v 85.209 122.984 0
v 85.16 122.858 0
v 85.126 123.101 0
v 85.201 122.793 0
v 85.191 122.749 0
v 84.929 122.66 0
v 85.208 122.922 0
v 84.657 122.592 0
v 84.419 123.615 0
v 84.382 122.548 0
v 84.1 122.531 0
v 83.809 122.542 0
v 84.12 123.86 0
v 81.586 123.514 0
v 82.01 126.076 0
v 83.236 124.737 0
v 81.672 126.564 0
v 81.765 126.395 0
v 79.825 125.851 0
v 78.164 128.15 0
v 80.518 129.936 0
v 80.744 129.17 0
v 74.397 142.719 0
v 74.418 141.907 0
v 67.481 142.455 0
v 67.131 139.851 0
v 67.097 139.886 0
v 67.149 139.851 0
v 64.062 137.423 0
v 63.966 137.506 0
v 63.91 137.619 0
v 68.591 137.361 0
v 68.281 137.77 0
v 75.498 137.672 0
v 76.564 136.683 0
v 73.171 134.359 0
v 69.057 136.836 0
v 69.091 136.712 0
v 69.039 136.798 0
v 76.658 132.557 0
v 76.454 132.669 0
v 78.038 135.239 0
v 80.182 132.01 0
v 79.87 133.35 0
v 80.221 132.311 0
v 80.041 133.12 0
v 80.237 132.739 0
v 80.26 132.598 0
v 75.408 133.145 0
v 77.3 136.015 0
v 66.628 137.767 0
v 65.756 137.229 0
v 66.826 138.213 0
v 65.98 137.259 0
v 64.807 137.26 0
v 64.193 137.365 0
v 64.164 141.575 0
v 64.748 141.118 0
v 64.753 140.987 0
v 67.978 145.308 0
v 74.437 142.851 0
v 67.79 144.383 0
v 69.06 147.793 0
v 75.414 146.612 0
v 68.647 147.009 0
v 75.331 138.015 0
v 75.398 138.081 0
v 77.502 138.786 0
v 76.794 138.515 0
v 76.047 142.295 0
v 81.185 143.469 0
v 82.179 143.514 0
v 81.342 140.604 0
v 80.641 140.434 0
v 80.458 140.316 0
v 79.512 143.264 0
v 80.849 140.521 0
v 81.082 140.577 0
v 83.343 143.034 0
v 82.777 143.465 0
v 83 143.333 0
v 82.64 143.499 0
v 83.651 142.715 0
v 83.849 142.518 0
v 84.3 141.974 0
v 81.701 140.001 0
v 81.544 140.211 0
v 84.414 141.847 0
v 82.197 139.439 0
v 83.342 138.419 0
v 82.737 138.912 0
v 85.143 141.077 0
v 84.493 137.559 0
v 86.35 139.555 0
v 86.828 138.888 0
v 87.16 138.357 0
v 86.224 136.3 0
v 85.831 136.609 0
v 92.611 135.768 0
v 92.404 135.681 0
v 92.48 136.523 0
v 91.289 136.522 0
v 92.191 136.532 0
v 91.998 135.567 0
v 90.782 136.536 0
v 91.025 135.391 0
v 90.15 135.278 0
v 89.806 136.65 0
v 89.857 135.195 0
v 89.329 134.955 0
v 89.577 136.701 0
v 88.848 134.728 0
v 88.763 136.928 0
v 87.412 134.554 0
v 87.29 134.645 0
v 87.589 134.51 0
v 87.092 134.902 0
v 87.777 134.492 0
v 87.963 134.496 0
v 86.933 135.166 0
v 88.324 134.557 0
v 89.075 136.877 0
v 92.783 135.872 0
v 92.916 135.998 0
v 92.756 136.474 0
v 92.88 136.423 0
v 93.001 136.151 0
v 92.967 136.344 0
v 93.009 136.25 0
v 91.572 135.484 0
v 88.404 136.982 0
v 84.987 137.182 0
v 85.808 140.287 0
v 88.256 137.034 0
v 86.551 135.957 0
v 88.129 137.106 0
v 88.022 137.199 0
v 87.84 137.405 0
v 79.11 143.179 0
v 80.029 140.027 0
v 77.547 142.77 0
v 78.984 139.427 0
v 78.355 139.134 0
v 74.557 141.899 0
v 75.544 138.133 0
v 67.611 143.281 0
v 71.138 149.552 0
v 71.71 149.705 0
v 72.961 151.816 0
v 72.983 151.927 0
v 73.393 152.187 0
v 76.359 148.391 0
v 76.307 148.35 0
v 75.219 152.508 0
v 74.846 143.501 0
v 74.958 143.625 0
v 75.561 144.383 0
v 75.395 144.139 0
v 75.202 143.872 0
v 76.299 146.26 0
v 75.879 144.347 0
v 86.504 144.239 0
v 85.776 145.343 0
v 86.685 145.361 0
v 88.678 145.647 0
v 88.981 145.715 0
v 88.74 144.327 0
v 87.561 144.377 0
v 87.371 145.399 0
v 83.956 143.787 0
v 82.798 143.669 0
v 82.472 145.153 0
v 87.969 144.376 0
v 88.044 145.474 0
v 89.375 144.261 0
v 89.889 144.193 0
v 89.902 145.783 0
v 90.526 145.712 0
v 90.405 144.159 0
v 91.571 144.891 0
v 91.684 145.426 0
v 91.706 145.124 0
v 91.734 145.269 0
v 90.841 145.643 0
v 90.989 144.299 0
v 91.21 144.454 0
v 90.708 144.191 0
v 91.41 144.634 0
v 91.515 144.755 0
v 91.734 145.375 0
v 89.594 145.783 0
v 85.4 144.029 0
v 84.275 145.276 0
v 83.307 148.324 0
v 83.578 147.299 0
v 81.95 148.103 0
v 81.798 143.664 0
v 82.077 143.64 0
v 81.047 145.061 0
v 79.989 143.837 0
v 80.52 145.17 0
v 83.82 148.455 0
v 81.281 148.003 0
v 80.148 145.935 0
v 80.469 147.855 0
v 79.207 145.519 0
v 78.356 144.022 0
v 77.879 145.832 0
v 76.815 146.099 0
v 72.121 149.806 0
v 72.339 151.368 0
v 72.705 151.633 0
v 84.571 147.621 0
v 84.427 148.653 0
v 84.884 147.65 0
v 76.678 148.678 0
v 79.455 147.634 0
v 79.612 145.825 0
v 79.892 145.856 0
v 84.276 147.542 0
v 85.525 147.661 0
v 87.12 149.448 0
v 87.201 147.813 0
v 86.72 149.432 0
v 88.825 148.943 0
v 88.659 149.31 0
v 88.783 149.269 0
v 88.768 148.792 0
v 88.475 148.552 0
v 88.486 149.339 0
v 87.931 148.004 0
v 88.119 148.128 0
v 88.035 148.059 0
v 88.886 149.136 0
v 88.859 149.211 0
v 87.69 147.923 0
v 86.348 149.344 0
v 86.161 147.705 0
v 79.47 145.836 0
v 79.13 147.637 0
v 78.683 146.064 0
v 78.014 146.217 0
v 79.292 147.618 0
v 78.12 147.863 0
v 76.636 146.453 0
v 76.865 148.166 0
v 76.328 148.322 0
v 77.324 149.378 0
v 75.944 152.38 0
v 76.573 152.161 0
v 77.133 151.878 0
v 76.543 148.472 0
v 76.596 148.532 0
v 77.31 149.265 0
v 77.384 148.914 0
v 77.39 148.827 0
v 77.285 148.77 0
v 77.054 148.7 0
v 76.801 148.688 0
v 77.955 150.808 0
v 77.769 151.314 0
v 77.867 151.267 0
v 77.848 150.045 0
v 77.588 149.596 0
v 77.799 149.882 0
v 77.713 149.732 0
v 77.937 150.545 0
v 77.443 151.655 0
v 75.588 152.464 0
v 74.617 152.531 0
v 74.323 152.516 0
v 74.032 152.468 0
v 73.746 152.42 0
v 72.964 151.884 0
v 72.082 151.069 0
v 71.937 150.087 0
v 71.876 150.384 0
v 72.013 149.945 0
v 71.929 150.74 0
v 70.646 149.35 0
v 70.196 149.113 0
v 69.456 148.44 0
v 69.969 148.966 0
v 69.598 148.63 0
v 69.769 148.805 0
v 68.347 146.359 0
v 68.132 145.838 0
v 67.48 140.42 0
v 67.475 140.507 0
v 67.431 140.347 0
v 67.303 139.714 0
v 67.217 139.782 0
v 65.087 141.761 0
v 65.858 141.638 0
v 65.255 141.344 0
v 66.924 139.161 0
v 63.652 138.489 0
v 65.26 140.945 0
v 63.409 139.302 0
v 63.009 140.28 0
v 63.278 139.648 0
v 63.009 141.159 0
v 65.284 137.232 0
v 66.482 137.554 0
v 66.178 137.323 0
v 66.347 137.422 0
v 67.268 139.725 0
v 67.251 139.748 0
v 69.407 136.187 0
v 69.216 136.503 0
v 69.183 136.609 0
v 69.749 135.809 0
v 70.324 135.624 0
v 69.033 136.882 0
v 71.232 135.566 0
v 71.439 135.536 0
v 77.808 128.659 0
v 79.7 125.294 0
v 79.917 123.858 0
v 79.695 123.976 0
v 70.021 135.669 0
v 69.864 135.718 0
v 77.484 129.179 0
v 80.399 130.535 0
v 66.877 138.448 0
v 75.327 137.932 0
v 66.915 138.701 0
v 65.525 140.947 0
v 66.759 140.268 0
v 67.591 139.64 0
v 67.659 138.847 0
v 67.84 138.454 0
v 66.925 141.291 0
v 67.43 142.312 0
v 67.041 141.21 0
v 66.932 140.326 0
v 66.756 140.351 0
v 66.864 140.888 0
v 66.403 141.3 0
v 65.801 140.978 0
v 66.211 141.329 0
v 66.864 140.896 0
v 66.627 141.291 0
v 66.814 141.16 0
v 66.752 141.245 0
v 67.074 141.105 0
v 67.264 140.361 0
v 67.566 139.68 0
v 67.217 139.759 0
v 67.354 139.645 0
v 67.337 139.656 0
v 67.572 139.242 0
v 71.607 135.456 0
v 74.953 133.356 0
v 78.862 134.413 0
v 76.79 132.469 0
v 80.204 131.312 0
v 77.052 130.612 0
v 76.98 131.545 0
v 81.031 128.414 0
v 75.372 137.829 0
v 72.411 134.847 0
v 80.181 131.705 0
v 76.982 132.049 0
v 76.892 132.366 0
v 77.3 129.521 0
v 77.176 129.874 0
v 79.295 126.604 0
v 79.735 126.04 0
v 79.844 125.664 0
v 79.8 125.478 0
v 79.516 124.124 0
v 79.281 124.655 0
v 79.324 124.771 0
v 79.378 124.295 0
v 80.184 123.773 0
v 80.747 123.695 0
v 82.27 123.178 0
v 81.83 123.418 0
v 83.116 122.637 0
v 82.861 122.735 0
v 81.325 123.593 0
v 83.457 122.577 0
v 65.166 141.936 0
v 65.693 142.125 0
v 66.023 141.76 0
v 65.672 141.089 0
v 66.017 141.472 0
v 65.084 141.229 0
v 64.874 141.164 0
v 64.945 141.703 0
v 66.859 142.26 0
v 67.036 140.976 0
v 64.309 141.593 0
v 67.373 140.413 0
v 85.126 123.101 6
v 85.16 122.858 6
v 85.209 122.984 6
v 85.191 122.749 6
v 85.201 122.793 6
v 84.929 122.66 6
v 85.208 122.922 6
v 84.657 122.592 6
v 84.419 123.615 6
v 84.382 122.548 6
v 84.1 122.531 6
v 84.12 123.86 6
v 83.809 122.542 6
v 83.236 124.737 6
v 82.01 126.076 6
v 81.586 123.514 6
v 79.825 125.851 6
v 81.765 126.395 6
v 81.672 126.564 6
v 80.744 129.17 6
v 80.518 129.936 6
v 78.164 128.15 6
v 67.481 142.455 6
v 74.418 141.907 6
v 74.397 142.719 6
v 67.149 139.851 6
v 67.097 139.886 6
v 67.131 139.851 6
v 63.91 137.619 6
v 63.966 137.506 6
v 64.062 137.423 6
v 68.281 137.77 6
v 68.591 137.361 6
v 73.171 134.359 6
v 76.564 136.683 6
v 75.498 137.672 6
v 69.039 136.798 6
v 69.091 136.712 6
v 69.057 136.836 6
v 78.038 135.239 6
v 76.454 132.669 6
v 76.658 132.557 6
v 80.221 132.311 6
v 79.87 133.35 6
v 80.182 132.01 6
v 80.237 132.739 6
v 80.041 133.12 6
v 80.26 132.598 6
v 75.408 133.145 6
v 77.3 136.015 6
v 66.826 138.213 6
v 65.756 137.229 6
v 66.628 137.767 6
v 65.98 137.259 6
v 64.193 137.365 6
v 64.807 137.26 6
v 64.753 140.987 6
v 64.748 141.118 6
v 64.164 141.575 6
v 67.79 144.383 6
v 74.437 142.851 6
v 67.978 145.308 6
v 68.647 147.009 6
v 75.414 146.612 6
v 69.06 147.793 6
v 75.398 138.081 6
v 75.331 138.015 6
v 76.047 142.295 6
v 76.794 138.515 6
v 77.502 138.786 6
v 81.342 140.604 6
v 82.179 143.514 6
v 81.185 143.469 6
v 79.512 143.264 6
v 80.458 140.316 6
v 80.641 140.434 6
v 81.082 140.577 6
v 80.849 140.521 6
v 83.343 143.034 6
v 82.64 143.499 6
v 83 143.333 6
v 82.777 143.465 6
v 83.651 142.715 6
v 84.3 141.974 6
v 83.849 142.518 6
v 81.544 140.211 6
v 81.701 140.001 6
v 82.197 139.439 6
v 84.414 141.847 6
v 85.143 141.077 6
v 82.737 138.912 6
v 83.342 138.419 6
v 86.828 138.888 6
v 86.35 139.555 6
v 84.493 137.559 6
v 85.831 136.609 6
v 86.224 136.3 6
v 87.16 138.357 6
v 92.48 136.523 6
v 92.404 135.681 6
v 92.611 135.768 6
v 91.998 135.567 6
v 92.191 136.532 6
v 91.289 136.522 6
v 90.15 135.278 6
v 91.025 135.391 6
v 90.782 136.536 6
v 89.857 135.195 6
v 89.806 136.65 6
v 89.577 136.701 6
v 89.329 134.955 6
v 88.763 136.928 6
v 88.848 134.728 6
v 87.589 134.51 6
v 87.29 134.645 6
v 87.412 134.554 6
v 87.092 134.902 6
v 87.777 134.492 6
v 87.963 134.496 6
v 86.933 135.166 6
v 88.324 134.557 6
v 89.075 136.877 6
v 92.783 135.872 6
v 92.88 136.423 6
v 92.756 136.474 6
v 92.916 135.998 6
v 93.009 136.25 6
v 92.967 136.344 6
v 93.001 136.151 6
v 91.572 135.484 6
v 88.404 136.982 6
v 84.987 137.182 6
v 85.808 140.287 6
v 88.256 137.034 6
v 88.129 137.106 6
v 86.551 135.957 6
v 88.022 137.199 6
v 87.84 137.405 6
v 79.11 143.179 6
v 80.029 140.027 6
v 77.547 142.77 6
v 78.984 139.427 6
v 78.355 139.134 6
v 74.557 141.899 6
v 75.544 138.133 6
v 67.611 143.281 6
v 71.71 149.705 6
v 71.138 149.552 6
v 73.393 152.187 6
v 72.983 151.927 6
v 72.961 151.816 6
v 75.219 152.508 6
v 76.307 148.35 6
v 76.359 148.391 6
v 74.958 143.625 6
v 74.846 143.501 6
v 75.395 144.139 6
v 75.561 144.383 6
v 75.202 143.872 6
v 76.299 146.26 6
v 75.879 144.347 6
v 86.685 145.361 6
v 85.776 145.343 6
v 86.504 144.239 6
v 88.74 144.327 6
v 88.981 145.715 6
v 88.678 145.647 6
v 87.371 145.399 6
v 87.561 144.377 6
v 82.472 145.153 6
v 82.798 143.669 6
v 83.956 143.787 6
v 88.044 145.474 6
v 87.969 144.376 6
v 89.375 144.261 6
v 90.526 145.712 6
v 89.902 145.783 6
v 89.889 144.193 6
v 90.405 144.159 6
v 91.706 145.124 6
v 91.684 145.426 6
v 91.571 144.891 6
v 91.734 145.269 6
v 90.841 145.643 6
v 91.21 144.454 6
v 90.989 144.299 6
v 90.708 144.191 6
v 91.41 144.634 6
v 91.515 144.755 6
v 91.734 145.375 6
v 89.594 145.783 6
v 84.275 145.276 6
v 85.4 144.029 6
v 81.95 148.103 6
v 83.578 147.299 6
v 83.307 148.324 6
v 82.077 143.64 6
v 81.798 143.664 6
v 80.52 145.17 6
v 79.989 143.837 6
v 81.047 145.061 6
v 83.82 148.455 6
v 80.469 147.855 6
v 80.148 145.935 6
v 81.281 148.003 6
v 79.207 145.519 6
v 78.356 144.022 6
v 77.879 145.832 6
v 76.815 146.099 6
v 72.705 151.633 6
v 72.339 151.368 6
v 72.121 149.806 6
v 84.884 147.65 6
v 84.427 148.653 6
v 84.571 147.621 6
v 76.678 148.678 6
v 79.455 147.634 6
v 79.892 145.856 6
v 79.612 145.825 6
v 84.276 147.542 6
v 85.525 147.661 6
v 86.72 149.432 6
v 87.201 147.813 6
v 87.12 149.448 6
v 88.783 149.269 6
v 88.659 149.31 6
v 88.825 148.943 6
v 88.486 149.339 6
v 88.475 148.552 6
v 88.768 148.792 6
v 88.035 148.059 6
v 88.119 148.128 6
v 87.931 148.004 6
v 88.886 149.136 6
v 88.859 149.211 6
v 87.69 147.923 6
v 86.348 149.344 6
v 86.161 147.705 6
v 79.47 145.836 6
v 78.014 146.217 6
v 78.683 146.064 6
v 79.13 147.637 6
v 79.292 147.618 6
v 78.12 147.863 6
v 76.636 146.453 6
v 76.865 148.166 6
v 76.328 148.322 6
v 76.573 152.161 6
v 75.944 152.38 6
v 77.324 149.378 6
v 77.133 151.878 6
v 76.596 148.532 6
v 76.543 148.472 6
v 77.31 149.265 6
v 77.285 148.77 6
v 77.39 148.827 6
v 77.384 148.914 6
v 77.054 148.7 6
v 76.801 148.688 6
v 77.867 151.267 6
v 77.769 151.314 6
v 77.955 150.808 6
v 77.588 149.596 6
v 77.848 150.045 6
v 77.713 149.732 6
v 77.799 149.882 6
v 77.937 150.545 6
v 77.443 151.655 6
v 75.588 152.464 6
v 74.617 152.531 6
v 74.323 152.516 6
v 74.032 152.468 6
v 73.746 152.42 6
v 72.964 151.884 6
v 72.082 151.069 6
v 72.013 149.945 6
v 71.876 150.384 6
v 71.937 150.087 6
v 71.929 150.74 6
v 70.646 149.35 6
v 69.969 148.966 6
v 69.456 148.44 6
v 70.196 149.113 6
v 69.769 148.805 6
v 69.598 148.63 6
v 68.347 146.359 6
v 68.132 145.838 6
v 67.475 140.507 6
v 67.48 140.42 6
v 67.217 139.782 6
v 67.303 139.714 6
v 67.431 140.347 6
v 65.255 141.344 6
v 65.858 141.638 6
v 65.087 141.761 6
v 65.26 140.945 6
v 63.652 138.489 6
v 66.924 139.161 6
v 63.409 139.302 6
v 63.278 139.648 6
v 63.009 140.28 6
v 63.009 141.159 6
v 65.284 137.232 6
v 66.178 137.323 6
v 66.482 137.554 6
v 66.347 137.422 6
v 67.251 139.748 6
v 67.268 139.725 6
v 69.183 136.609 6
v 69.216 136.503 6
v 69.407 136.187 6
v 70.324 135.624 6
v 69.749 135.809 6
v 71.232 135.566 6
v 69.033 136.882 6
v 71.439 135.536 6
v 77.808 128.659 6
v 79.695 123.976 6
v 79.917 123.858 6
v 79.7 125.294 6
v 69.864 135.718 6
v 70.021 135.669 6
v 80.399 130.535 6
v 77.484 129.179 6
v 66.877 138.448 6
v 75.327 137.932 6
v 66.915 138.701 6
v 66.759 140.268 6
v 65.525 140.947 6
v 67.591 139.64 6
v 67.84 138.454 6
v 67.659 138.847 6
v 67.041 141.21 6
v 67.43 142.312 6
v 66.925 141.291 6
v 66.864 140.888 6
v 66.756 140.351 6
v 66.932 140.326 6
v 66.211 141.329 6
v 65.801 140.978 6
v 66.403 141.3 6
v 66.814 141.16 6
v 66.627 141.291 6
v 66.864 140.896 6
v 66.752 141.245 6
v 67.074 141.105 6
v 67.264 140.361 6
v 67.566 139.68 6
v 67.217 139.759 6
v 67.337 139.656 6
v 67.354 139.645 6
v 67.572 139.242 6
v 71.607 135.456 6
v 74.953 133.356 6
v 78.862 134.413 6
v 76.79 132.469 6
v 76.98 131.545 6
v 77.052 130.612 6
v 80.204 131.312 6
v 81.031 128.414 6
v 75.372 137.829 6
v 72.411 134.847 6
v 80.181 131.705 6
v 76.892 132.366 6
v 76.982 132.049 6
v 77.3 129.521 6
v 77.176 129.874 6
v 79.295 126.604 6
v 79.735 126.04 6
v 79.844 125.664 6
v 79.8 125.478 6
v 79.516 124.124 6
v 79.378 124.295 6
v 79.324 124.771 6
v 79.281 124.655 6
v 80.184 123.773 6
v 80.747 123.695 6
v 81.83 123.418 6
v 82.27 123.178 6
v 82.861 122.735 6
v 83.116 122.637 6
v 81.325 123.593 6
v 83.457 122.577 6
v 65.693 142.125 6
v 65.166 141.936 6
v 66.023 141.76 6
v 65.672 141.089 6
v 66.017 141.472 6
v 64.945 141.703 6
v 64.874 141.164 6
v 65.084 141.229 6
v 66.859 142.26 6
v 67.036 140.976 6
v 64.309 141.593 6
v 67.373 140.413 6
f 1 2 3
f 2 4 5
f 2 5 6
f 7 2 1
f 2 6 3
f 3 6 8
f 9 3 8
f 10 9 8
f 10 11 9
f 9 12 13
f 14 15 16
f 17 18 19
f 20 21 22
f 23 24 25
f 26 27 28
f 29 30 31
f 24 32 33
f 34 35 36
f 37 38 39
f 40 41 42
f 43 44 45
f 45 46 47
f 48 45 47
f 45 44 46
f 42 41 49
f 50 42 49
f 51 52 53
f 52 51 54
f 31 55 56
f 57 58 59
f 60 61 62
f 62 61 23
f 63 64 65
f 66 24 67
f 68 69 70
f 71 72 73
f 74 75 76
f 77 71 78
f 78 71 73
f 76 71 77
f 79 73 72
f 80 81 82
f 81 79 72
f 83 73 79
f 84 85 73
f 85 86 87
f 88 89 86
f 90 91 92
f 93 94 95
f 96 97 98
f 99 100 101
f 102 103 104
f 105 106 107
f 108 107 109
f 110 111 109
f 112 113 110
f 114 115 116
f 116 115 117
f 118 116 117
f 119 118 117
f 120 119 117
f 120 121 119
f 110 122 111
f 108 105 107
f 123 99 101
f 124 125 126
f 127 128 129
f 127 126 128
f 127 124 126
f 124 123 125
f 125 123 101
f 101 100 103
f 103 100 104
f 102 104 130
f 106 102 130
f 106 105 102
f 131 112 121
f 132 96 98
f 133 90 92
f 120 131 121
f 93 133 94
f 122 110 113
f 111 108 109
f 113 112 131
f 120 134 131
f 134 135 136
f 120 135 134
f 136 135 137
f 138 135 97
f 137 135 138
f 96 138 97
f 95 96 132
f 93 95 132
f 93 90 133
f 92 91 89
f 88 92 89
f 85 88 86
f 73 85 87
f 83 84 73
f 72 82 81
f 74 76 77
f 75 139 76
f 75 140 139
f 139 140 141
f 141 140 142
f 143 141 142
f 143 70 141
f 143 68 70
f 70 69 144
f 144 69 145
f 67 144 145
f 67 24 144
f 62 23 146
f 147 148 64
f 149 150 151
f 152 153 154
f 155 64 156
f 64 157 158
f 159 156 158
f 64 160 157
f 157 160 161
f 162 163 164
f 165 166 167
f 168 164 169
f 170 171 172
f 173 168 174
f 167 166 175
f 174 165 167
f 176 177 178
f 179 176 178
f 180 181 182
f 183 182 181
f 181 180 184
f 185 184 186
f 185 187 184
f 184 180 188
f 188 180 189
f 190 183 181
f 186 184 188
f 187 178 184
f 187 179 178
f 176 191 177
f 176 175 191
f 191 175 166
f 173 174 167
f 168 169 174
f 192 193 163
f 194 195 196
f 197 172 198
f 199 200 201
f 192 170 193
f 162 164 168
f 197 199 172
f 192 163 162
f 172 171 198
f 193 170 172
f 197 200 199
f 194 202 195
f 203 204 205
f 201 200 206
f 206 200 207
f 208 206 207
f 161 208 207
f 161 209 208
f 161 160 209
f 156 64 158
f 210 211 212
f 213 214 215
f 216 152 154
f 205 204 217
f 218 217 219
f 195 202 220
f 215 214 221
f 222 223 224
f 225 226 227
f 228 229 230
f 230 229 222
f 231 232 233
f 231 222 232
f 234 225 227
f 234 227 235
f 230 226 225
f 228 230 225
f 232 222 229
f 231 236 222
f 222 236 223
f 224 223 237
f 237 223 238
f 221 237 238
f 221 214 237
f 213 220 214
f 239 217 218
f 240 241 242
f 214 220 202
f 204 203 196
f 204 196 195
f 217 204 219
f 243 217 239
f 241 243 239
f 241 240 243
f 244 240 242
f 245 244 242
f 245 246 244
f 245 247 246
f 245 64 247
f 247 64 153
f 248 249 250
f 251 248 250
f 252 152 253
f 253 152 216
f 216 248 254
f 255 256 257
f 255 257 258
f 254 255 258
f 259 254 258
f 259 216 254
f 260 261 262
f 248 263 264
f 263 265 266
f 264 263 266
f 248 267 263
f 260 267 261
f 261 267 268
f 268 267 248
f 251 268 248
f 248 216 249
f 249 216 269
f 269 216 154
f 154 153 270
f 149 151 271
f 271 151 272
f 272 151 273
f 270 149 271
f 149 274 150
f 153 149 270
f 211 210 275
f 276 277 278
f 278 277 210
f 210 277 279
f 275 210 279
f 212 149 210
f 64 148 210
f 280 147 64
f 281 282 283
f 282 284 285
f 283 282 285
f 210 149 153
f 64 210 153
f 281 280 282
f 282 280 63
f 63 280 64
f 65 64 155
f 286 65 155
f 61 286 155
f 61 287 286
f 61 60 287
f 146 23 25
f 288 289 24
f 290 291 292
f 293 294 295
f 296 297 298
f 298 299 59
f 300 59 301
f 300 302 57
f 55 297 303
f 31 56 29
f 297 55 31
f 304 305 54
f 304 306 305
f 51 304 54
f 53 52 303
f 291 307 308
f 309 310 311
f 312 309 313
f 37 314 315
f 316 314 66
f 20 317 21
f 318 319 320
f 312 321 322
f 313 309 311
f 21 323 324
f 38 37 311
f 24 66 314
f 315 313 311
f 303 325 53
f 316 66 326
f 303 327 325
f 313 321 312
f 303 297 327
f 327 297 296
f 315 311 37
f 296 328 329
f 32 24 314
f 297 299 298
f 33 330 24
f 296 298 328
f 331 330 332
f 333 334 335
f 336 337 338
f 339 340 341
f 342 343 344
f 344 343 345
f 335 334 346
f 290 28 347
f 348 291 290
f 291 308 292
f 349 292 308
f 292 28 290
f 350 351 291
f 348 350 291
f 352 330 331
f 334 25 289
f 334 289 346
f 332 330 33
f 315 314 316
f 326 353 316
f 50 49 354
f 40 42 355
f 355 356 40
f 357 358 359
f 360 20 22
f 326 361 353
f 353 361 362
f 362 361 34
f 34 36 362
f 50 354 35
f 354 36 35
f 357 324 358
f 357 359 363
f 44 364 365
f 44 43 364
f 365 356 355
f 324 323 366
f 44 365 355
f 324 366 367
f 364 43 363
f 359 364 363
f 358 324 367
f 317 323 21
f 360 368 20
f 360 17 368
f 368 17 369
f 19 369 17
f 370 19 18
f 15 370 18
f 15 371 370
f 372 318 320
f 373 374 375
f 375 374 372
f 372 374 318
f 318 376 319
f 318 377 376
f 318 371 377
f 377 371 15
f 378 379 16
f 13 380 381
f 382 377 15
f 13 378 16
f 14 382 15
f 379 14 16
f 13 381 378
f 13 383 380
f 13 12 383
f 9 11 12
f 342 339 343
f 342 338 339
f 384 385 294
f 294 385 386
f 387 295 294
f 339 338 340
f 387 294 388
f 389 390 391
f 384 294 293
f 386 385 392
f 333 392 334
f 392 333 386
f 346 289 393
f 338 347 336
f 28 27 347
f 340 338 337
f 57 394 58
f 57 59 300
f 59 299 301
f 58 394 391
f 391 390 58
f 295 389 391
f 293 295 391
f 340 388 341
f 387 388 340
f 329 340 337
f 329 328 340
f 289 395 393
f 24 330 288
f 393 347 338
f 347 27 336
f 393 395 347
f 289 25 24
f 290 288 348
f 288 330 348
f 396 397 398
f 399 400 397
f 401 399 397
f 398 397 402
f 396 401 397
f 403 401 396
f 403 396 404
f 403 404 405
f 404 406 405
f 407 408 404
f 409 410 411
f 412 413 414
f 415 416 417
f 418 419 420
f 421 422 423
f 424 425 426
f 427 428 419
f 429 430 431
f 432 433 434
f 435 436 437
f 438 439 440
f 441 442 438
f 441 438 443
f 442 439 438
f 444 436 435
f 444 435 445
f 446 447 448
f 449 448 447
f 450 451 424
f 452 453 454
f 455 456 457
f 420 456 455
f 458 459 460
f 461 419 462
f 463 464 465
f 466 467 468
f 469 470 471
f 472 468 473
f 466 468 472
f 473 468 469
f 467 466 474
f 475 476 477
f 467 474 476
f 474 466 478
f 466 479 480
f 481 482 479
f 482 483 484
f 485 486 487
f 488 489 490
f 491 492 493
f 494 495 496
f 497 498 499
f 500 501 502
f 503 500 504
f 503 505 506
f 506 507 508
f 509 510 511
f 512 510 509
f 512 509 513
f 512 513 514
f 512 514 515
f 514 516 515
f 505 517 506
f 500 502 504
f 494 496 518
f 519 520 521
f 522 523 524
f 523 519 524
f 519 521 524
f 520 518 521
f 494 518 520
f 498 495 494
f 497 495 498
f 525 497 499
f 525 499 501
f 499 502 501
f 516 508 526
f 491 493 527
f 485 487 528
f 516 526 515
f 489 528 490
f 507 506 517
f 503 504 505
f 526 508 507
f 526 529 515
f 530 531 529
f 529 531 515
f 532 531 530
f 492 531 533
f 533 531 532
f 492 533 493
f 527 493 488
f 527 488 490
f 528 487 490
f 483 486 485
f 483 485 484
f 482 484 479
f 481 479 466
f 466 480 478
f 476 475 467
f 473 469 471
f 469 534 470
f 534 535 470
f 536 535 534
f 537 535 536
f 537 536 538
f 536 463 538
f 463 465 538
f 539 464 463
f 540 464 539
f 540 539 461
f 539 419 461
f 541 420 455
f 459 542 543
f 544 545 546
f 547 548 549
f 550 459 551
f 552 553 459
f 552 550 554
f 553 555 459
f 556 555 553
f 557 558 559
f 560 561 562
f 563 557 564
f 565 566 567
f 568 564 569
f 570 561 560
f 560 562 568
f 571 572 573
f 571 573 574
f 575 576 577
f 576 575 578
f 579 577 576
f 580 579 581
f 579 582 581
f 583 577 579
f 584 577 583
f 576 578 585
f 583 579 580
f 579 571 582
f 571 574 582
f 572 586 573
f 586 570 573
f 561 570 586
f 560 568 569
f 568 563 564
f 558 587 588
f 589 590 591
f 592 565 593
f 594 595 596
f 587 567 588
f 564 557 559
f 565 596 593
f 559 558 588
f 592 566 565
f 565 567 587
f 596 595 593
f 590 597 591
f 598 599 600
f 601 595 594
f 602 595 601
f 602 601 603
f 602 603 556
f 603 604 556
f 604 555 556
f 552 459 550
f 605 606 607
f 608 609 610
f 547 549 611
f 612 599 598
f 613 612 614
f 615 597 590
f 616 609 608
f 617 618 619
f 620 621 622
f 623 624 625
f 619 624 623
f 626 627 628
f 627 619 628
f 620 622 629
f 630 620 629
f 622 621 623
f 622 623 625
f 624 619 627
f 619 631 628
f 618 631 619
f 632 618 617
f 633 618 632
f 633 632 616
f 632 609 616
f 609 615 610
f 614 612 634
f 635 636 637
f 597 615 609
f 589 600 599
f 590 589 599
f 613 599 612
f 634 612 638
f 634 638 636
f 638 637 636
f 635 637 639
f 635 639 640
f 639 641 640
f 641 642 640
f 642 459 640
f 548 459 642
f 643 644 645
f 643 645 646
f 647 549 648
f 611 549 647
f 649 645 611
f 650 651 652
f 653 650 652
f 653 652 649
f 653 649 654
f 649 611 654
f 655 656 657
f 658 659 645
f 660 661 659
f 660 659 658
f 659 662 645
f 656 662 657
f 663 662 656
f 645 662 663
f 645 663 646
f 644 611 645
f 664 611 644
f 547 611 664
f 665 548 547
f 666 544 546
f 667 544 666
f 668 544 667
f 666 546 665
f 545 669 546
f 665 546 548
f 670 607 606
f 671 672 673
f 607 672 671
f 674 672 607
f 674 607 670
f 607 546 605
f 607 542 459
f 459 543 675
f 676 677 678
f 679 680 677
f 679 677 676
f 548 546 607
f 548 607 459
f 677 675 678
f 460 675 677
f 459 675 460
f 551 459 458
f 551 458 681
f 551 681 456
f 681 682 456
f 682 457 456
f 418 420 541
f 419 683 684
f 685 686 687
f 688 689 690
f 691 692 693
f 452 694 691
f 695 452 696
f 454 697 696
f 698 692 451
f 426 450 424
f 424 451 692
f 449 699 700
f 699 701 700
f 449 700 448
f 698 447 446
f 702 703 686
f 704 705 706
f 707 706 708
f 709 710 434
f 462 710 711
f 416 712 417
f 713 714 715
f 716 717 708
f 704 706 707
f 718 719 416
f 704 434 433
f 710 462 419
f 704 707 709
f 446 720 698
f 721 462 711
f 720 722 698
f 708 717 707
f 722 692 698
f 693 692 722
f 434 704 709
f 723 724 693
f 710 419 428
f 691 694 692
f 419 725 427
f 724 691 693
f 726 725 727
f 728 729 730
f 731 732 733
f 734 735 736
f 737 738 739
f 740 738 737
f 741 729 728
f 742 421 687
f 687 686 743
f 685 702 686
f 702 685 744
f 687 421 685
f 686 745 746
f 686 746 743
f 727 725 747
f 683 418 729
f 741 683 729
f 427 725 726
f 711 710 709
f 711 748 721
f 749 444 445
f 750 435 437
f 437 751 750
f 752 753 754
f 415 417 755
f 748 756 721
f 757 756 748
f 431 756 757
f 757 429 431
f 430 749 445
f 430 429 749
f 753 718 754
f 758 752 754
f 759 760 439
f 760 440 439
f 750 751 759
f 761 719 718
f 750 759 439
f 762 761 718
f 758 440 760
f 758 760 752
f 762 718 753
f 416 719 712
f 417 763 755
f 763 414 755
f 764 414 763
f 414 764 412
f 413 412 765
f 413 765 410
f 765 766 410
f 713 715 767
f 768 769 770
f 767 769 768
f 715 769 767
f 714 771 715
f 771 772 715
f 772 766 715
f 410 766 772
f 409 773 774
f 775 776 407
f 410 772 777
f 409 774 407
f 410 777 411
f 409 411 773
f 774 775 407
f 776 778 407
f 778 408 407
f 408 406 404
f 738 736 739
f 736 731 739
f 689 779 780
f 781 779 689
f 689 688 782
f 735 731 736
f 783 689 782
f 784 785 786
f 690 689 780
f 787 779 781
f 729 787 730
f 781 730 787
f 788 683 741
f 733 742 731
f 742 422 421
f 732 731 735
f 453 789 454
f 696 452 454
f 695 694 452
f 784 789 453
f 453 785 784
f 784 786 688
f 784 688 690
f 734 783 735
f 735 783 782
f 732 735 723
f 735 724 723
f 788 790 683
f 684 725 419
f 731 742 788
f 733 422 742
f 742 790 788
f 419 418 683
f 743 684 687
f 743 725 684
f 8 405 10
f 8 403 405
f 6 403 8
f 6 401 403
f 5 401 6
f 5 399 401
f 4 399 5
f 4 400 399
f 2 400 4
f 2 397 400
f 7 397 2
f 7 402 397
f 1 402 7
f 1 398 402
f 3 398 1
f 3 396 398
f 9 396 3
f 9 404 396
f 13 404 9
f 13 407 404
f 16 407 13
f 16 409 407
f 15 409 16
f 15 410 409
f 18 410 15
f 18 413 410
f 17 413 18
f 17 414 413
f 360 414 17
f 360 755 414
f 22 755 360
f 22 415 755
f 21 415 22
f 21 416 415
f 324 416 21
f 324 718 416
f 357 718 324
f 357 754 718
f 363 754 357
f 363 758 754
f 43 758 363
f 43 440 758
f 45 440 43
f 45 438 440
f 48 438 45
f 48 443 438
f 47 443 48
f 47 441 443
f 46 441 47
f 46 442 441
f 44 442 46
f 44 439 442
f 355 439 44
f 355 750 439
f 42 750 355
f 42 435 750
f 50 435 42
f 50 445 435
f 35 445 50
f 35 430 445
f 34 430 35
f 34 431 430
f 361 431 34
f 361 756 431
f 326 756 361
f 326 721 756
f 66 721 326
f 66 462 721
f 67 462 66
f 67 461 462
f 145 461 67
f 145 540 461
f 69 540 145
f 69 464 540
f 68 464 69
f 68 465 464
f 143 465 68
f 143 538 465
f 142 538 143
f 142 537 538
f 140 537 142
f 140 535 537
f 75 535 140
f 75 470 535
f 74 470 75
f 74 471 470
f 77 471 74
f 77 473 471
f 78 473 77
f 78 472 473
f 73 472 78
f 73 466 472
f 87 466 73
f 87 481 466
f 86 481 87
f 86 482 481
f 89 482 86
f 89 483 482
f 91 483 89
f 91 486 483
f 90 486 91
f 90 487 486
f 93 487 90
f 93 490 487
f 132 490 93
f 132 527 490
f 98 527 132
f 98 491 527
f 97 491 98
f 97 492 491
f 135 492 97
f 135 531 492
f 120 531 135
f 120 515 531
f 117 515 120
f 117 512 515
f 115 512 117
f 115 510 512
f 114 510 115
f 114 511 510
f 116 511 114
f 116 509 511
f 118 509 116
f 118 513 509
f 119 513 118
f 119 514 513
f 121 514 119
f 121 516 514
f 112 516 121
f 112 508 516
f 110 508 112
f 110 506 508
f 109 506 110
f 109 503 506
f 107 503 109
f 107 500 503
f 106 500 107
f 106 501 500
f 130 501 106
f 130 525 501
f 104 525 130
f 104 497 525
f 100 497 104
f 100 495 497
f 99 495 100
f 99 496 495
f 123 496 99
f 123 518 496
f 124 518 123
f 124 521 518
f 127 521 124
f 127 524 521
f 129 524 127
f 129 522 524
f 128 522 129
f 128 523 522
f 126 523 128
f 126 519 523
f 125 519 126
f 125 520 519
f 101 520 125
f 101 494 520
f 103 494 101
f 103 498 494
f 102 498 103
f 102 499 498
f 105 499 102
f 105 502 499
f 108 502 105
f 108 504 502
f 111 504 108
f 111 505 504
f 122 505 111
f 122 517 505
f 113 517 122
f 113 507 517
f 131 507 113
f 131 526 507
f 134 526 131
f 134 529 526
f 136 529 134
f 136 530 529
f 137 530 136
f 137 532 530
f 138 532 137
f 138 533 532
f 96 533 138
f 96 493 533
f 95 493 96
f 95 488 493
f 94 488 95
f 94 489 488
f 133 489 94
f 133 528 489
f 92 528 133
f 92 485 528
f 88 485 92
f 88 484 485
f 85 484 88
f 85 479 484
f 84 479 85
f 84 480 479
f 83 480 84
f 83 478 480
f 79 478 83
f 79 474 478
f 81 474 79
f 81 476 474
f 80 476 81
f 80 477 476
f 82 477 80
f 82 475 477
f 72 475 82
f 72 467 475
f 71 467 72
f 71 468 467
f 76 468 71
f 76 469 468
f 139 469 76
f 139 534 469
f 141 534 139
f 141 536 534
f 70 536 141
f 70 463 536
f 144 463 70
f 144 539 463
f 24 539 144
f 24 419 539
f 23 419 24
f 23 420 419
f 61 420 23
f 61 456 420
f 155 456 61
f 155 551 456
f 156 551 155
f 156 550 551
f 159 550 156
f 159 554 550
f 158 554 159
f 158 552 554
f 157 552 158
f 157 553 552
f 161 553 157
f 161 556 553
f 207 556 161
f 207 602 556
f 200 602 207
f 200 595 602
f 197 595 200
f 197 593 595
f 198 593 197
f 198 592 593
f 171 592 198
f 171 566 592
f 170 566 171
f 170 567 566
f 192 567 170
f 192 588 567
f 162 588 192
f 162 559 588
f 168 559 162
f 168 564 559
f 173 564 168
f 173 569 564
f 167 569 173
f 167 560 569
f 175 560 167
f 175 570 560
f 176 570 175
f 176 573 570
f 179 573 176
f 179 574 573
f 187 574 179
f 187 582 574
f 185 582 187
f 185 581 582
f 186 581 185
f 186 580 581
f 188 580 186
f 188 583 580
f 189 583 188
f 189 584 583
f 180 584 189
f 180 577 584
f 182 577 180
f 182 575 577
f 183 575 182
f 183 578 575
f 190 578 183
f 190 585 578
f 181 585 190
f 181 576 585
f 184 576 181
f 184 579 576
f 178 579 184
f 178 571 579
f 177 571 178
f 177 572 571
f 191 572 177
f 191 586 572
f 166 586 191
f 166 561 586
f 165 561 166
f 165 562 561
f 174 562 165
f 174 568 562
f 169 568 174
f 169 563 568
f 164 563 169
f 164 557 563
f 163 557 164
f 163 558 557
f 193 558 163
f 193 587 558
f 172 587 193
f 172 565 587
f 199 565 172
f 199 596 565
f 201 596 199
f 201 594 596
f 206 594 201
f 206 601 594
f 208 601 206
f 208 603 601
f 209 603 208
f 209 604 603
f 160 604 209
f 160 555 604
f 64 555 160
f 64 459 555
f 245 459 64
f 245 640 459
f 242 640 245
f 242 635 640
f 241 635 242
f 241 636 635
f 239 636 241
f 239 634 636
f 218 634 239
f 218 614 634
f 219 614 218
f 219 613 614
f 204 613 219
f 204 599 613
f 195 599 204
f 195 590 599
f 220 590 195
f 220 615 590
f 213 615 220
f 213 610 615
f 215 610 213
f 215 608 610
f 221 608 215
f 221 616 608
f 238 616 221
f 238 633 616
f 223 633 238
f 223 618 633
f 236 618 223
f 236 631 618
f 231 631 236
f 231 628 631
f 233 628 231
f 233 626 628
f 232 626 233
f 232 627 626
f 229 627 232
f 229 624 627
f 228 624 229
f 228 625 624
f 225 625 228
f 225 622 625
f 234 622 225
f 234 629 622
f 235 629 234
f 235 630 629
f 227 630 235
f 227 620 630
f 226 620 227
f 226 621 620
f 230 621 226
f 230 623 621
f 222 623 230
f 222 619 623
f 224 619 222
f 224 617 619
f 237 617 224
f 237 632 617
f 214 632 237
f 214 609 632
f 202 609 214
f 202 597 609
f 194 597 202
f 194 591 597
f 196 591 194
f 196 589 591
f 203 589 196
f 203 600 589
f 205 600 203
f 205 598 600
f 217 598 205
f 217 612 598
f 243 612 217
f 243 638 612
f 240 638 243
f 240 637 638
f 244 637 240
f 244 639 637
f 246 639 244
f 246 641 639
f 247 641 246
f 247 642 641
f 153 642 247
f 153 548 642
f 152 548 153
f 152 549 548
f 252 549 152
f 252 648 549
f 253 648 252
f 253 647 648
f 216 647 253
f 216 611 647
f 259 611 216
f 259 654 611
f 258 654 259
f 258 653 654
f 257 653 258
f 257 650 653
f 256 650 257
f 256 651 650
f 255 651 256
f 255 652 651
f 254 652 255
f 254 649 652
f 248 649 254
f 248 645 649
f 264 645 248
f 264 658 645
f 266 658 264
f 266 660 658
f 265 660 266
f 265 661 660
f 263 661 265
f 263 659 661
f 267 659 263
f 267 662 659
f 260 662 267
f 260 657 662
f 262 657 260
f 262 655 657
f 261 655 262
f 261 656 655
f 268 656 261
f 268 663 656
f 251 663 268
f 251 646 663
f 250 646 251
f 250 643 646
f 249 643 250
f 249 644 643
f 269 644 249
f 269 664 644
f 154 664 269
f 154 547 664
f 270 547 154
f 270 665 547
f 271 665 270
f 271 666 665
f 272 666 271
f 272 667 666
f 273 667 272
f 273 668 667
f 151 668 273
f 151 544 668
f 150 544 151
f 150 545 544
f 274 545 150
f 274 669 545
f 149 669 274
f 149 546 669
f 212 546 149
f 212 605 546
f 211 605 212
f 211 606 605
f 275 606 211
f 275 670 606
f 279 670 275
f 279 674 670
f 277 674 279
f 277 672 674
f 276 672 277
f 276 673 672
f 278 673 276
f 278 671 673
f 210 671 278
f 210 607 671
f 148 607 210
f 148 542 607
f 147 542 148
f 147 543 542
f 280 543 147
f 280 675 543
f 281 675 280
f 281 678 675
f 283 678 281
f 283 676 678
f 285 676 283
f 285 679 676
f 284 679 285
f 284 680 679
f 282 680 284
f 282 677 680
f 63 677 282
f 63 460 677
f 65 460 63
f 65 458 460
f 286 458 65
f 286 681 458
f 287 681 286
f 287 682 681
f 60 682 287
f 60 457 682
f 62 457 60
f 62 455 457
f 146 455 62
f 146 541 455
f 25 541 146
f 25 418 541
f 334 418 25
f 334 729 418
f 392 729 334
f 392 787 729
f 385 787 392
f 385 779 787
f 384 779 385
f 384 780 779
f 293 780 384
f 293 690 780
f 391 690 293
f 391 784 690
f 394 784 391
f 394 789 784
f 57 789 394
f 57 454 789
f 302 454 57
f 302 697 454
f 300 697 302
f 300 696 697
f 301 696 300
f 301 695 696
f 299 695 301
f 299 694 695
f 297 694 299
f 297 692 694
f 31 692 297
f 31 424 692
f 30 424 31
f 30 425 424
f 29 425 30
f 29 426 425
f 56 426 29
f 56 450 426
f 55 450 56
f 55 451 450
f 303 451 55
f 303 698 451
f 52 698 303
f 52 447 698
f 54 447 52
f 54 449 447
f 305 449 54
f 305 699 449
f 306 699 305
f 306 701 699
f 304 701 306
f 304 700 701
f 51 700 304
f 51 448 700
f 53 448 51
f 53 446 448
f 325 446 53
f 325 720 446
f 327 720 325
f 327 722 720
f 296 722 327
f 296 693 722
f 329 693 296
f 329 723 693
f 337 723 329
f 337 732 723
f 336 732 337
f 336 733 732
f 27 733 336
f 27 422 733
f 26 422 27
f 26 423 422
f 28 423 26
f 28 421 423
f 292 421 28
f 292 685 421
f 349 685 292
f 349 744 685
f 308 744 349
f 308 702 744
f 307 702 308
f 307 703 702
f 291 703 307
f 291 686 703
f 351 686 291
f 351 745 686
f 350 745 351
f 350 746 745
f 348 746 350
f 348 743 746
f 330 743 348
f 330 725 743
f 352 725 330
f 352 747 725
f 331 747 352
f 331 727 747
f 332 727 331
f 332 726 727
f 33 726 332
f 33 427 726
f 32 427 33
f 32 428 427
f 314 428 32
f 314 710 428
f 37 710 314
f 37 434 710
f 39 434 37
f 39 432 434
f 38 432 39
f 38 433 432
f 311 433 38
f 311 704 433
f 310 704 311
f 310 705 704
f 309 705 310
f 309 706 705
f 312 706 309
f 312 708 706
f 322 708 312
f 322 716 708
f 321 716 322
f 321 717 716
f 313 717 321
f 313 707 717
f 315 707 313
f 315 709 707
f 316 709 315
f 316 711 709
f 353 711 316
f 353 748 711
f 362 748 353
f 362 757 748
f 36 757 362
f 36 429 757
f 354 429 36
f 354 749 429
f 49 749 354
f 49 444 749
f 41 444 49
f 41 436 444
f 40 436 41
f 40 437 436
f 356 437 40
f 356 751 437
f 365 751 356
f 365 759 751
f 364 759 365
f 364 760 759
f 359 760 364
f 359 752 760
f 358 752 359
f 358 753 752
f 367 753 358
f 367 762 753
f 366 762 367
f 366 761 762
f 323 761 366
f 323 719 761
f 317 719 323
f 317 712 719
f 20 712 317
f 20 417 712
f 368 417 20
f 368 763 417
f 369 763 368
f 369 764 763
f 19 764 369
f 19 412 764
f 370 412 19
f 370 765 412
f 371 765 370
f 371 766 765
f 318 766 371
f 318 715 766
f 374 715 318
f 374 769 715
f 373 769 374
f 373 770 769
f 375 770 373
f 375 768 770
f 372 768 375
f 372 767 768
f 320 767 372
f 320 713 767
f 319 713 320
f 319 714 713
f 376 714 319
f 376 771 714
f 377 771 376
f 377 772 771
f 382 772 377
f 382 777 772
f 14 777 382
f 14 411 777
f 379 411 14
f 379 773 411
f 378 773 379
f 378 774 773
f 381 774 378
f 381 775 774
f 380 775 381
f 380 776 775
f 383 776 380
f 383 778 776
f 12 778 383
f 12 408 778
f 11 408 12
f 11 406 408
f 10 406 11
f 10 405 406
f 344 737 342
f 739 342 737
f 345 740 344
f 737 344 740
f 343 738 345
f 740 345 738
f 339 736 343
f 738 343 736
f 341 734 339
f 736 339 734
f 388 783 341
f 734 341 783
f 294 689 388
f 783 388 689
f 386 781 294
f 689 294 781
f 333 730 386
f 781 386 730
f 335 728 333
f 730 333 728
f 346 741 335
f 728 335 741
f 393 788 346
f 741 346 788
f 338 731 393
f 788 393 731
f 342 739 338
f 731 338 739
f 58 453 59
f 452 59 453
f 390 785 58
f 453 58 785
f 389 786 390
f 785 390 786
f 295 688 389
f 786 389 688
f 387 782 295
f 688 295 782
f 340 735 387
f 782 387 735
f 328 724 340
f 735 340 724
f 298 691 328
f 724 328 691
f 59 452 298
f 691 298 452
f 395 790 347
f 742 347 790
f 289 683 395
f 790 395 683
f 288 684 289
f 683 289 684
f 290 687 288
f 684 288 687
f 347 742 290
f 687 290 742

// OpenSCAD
// Creative Commons CC-BY-3.0
// Based on rock climber by Shems Dance, US
// https://thenounproject.com/search/?q=climber&i=176128

height_svg = 6.000000000;

center_svg_1 = [78.008886135,137.530884814];
size_svg_1 = [85.816373854,128.216972539];
stroke_width_svg_1 = 0.007000434;
color_svg_1 = [0.00000,0.00000,0.00000];
// paths for svg_1
points_svg_1_1 = [ [-9.701944073,64.108486270],[-10.544566583,64.043736444],[-11.374711344,63.841320603],[-12.195332427,63.635646749],[-13.202966633,62.639385327],[-14.375425796,61.529340835],[-14.430644544,61.341818389],[-14.440673906,61.054927374],[-15.171894927,60.272027936],[-16.219272154,59.137738805],[-16.955024867,57.861553715],[-17.392329069,56.455545355],[-17.544360760,54.931786415],[-17.369683836,53.662957197],[-17.150842455,53.055082363],[-16.843627677,52.461652290],[-18.017716219,52.031188436],[-19.653791073,51.375931936],[-21.061188536,50.515502967],[-22.348201906,49.501110311],[-22.998308044,48.872058393],[-23.570222365,48.185873837],[-24.060293123,47.438359196],[-24.464868573,46.625317020],[-25.599166427,43.859077103],[-26.778938219,40.508893832],[-27.637283594,37.730252895],[-28.252571805,35.503093913],[-28.694582406,33.237503540],[-29.231501365,29.284774061],[-29.743615635,24.573949832],[-30.114135490,21.044447853],[-30.261413156,20.435183874],[-31.893355219,20.213492145],[-35.231134823,19.634200165],[-36.736471115,18.824945582],[-36.962811573,18.080289020],[-37.368989323,17.831207624],[-39.190066135,17.363019478],[-39.604512115,17.282922165],[-42.908186927,15.506803353],[-42.908186927,11.749926395],[-42.139757552,9.048281853],[-41.764586323,7.568268832],[-41.069539135,4.096128520],[-40.331600344,0.377494436],[-40.171519862,-0.107153976],[-39.895494581,-0.461825082],[-39.520616171,-0.707024668],[-37.764829802,-1.156263397],[-36.401535404,-1.275500191],[-35.050268302,-1.288555064],[-34.409900940,-1.163938588],[-33.842830685,-0.887225473],[-33.360001614,-0.464299143],[-32.972357802,0.098956978],[-32.555494978,1.011156843],[-31.990500338,2.916329567],[-31.842711323,3.920429311],[-31.733157948,5.000982353],[-31.707837323,6.966754499],[-32.180158260,11.699282499],[-32.190492885,12.054300415],[-31.685614969,11.944747040],[-31.214841844,10.065274040],[-31.115623094,9.917480436],[-31.066532302,9.917480436],[-30.870677135,9.622925103],[-30.870677135,9.524738228],[-30.772492906,9.476163374],[-30.723399469,9.377976499],[-30.625215240,9.328885707],[-30.527031010,9.083421165],[-30.477421635,9.033811790],[-29.871771865,9.185740832],[-29.800977302,9.012623957],[-29.855684206,7.311130543],[-29.607188531,5.624200457],[-29.088251648,3.947440954],[-27.827968802,1.023966770],[-26.939997701,-0.724280835],[-25.676162823,-2.773735397],[-25.608400055,-2.971032543],[-25.659110427,-3.134436564],[-25.511314177,-3.500305043],[-25.246362758,-3.938756533],[-25.151131594,-4.392241918],[-24.605428469,-5.744096064],[-23.627708385,-7.361052126],[-23.299485484,-7.746139277],[-22.851013427,-7.957915085],[-21.984399823,-8.149634814],[-19.385074948,-8.399232147],[-18.793886971,-8.527161165],[-18.313306073,-8.866904355],[-16.014335206,-11.472265038],[-13.838643635,-13.556022168],[-8.741973563,-17.844207595],[-7.439034260,-18.745371814],[-4.448001698,-20.777805730],[-3.863539760,-21.259429418],[-3.486408961,-21.635337512],[-3.195882240,-22.073848668],[-2.938532615,-23.427255918],[-2.943699927,-25.583713272],[-2.736994198,-29.568999730],[-2.382494865,-32.725396876],[-2.029091237,-34.232786335],[-1.502445719,-35.696789418],[-0.575091388,-37.915747309],[0.443689052,-40.091354543],[3.680183510,-46.699736043],[4.939023385,-49.111992564],[5.195930950,-49.917873503],[5.249605523,-50.718351733],[5.122796726,-51.512888248],[4.838254177,-52.300944043],[3.761315344,-54.534916376],[3.639360948,-55.028943730],[3.915829365,-56.568900751],[4.310398852,-57.300240421],[4.822862042,-57.930408220],[5.458001279,-58.437798769],[6.220598906,-58.800806689],[7.831353135,-59.134120835],[9.485141389,-59.570607308],[10.232073900,-59.906047996],[10.929706320,-60.315205952],[12.189093841,-61.341430568],[13.880953156,-63.237733259],[14.609232010,-63.655291730],[15.584082026,-63.912442257],[16.592575135,-64.058884501],[17.424102344,-64.108486270],[18.229699724,-64.034181678],[19.017202581,-63.846783587],[19.794446219,-63.557104855],[20.545304615,-63.178316772],[20.572297737,-62.987249902],[20.454870031,-62.709612689],[20.592231280,-62.436095906],[20.596652302,-62.172823707],[20.358236260,-61.669882210],[18.336136969,-59.476735085],[17.479985651,-58.426339913],[14.951848906,-54.678061251],[11.446119740,-48.955412147],[10.743704568,-47.593569980],[10.478812085,-46.869278645],[8.644221927,-38.964808980],[7.824570542,-35.733470921],[7.178163031,-32.458744501],[6.837096594,-29.898694376],[6.278650474,-26.577887793],[6.212846615,-24.900032585],[6.217262841,-23.596532035],[6.327567302,-22.307428126],[6.440023487,-21.082479392],[6.372600832,-20.481780306],[5.813108492,-18.852886243],[5.324010656,-17.867389064],[2.441499594,-13.325030335],[0.084538344,-9.796562876],[-2.027992885,-6.479968460],[-4.133808990,-3.624847064],[-7.183751031,0.602803020],[-7.543420323,1.276146436],[-7.671252562,1.715079189],[-7.660091982,2.068661493],[-7.467217718,2.350126649],[-7.049908906,2.572707957],[-3.476483448,4.204134082],[-1.449216844,5.366334895],[0.988876240,6.849967415],[2.788410677,8.105269150],[5.777747591,10.667817934],[7.006080677,11.902887311],[7.529997762,12.407828976],[8.123187891,12.779219723],[8.789826683,13.020694430],[9.534089760,13.135887978],[10.111531310,11.456087090],[10.561935156,10.556200478],[11.980969656,8.156863561],[13.524517734,5.901222184],[15.255704344,3.794855415],[18.548528594,0.119110290],[19.961361260,-1.490609418],[22.375168240,-3.941622105],[23.499414242,-5.258889257],[24.436023698,-6.725433001],[25.528464469,-10.107138730],[25.981278669,-11.234710876],[26.549589448,-12.333358772],[26.899473456,-12.723072493],[27.403283448,-12.910584355],[27.943362027,-12.987538005],[28.474990146,-12.969405861],[29.508065031,-12.710596397],[31.005395362,-11.977633757],[32.382307865,-11.008891647],[33.891506411,-9.982980025],[34.729794716,-9.630587312],[37.234459281,-9.145566829],[38.798453698,-8.747013710],[40.015318089,-8.391328712],[41.179187760,-7.905720730],[41.768760084,-7.533896398],[42.263197253,-7.088729069],[42.642089722,-6.549763311],[42.885027948,-5.896543689],[42.908186927,-5.475154051],[42.787536266,-5.071800397],[42.540577159,-4.735877790],[42.184810802,-4.516781293],[41.395549458,-4.305602783],[40.567854740,-4.267699897],[37.988167240,-4.313176480],[36.537838484,-4.253743457],[33.745348263,-3.763306168],[33.091408685,-3.544787289],[31.654584966,-2.793573855],[30.761734948,-2.577364293],[29.734896705,-2.343814146],[29.312195974,-2.125453645],[28.948414313,-1.815625858],[28.644036406,-1.416711293],[28.123137969,-0.537696668],[26.177519135,3.529756145],[25.227188719,5.800934186],[23.858798115,8.649856395],[22.310572865,11.780930270],[20.408319240,15.156897517],[18.323217365,18.446157499],[17.995589115,18.991344686],[16.705229427,21.314201145],[16.139888927,22.154459603],[15.259197174,23.519419553],[14.277470969,24.797707957],[13.638811451,25.360358967],[13.248561493,25.506260801],[11.929293885,25.573371040],[9.086054927,25.379584915],[4.301083865,24.501471858],[3.151016844,24.138316020],[-1.321060615,22.391137332],[-5.613306073,20.361804332],[-9.873476424,18.667245978],[-10.271420010,18.704023061],[-10.332195133,22.173037983],[-10.218492223,22.738493908],[-9.048511214,25.515498066],[-8.727843490,26.045694624],[-8.030606544,27.100016212],[-7.477790427,28.240908145],[-7.002884510,29.287356395],[-6.091828844,29.133360957],[0.993009031,27.743782520],[5.665077094,26.950032520],[10.837598578,26.213387540],[11.637432755,26.107856163],[13.699726802,26.234313436],[17.010637969,26.736609020],[21.142683510,27.771169540],[24.299596594,28.671374645],[27.323504628,29.257941673],[28.490038323,29.256868457],[30.697658156,29.046027290],[32.513567656,28.763872978],[33.983969357,28.474381108],[35.459123635,28.329276332],[36.325737240,28.464150332],[37.130712518,28.925099478],[37.762342719,29.588113561],[38.333366469,30.358093395],[38.633644078,30.873234168],[38.794320906,31.455698832],[39.182555607,32.452785423],[39.262509052,33.073170832],[39.261993115,33.523790645],[39.117309357,33.741518585],[36.708142177,34.669973582],[35.806465550,34.967078181],[34.021870470,35.266797571],[33.138354409,35.269265085],[31.387391229,34.979047554],[30.519346503,34.686215231],[28.706046802,33.947536728],[26.781261922,33.629209905],[24.817912698,33.464878520],[22.218587823,33.386847603],[17.925310490,33.102626895],[12.766967365,32.574494749],[8.691764906,32.181236603],[7.183846281,32.648908811],[3.428442721,34.139532616],[-0.370214260,35.476127249],[-3.414683396,36.619374965],[-4.890923624,37.308603675],[-7.424048260,38.809774061],[-3.926587323,38.131260686],[0.014669161,37.123788207],[1.927895140,36.471430465],[4.180050798,35.493942099],[4.586914562,35.449173152],[5.386023698,35.581029249],[6.119737424,35.918154056],[15.930995094,41.747278770],[17.927892823,42.786273707],[18.771093117,43.123398514],[19.667321865,43.248778603],[21.500041005,43.295270194],[23.318262302,43.481320895],[26.294700117,43.943587996],[27.694221927,44.413564395],[28.381483419,44.759511733],[28.680264438,44.994120586],[28.919470302,45.293097603],[29.939047469,47.103323853],[30.777073174,48.128291243],[30.940019135,48.772471624],[31.115051056,49.598147696],[31.037798221,49.918382371],[30.819801109,50.167568980],[30.464078698,50.343951103],[29.970053990,50.465908145],[26.061763927,50.933064415],[24.919647966,50.865107840],[23.854662677,50.489162374],[18.358588518,47.534326134],[16.624097594,46.687327415],[15.154419198,46.128704686],[11.273002865,45.183544228],[9.360456948,44.758763624],[7.038119073,44.123144499],[4.138037031,43.177981395],[3.670314221,43.112251618],[3.207343990,43.190900999],[0.319149677,44.158283811],[-3.270945523,45.451639905],[-4.808702865,46.119920520],[-4.867096406,46.241877561],[-4.719302802,46.414994436],[-4.192479682,46.762053025],[-4.041910103,47.018616755],[-3.806289880,47.643025236],[-3.455814198,47.686232686],[-2.731499133,47.734744702],[-2.069852615,48.033498311],[-1.769927232,48.278989642],[-1.787698302,48.649482707],[-1.999571344,50.151199499],[-1.959708888,50.631758569],[-1.204664329,51.566296048],[-0.846327669,52.148235142],[-0.599913232,52.789084873],[-0.461164781,53.482261332],[-0.205365615,55.619081311],[-0.153823458,56.746802285],[-0.405353573,58.705715770],[-0.684824018,58.908638618],[-1.619186169,60.365636527],[-2.504967844,61.316409790],[-4.107548763,62.527709993],[-5.907342823,63.464598915],[-6.924497729,63.823572022],[-7.980086010,64.009267520],[-9.701944073,64.108486270] ];
points_svg_1_2 = [ [-34.287006240,18.076672165],[-31.705768281,16.069558874],[-31.374556581,15.725798978],[-31.279955802,15.277359332],[-31.388477302,14.725454374],[-31.879919677,14.346666290],[-31.880951552,14.383874645],[-32.024039583,15.510774955],[-32.201847810,15.874609574],[-32.558851549,16.068880838],[-33.198700906,16.108315040],[-33.746989010,16.234407520],[-34.303643240,16.843689689],[-34.756744844,17.553704686],[-34.287006240,18.076672165] ];
points_svg_1_3 = [ [-36.483254281,16.294867457],[-35.288935367,15.205305684],[-34.921593490,14.731656207],[-35.711892289,14.598715154],[-36.468180638,14.591078452],[-37.917793365,14.772997353],[-37.933080659,15.331895910],[-37.573628656,15.529023061],[-36.972061406,15.807077986],[-36.483254281,16.294867457] ];
points_svg_1_4 = [ [-30.132738344,12.721441999],[-30.119703315,12.349391199],[-30.258312240,12.034663040],[-30.736319073,12.097192020],[-30.423636805,12.316007066],[-30.132738344,12.721441999] ];

module polygon_svg_1() {
 render(convexity=4) linear_extrude(height=height_svg) {
    resize(newsize=[30,30])
    difference() {
      polygon(points=points_svg_1_1);
      union() {
        polygon(points=points_svg_1_2);
        polygon(points=points_svg_1_3);
        polygon(points=points_svg_1_4);
      }
    }
 }
}

translate(center_svg_1) polygon_svg_1();
